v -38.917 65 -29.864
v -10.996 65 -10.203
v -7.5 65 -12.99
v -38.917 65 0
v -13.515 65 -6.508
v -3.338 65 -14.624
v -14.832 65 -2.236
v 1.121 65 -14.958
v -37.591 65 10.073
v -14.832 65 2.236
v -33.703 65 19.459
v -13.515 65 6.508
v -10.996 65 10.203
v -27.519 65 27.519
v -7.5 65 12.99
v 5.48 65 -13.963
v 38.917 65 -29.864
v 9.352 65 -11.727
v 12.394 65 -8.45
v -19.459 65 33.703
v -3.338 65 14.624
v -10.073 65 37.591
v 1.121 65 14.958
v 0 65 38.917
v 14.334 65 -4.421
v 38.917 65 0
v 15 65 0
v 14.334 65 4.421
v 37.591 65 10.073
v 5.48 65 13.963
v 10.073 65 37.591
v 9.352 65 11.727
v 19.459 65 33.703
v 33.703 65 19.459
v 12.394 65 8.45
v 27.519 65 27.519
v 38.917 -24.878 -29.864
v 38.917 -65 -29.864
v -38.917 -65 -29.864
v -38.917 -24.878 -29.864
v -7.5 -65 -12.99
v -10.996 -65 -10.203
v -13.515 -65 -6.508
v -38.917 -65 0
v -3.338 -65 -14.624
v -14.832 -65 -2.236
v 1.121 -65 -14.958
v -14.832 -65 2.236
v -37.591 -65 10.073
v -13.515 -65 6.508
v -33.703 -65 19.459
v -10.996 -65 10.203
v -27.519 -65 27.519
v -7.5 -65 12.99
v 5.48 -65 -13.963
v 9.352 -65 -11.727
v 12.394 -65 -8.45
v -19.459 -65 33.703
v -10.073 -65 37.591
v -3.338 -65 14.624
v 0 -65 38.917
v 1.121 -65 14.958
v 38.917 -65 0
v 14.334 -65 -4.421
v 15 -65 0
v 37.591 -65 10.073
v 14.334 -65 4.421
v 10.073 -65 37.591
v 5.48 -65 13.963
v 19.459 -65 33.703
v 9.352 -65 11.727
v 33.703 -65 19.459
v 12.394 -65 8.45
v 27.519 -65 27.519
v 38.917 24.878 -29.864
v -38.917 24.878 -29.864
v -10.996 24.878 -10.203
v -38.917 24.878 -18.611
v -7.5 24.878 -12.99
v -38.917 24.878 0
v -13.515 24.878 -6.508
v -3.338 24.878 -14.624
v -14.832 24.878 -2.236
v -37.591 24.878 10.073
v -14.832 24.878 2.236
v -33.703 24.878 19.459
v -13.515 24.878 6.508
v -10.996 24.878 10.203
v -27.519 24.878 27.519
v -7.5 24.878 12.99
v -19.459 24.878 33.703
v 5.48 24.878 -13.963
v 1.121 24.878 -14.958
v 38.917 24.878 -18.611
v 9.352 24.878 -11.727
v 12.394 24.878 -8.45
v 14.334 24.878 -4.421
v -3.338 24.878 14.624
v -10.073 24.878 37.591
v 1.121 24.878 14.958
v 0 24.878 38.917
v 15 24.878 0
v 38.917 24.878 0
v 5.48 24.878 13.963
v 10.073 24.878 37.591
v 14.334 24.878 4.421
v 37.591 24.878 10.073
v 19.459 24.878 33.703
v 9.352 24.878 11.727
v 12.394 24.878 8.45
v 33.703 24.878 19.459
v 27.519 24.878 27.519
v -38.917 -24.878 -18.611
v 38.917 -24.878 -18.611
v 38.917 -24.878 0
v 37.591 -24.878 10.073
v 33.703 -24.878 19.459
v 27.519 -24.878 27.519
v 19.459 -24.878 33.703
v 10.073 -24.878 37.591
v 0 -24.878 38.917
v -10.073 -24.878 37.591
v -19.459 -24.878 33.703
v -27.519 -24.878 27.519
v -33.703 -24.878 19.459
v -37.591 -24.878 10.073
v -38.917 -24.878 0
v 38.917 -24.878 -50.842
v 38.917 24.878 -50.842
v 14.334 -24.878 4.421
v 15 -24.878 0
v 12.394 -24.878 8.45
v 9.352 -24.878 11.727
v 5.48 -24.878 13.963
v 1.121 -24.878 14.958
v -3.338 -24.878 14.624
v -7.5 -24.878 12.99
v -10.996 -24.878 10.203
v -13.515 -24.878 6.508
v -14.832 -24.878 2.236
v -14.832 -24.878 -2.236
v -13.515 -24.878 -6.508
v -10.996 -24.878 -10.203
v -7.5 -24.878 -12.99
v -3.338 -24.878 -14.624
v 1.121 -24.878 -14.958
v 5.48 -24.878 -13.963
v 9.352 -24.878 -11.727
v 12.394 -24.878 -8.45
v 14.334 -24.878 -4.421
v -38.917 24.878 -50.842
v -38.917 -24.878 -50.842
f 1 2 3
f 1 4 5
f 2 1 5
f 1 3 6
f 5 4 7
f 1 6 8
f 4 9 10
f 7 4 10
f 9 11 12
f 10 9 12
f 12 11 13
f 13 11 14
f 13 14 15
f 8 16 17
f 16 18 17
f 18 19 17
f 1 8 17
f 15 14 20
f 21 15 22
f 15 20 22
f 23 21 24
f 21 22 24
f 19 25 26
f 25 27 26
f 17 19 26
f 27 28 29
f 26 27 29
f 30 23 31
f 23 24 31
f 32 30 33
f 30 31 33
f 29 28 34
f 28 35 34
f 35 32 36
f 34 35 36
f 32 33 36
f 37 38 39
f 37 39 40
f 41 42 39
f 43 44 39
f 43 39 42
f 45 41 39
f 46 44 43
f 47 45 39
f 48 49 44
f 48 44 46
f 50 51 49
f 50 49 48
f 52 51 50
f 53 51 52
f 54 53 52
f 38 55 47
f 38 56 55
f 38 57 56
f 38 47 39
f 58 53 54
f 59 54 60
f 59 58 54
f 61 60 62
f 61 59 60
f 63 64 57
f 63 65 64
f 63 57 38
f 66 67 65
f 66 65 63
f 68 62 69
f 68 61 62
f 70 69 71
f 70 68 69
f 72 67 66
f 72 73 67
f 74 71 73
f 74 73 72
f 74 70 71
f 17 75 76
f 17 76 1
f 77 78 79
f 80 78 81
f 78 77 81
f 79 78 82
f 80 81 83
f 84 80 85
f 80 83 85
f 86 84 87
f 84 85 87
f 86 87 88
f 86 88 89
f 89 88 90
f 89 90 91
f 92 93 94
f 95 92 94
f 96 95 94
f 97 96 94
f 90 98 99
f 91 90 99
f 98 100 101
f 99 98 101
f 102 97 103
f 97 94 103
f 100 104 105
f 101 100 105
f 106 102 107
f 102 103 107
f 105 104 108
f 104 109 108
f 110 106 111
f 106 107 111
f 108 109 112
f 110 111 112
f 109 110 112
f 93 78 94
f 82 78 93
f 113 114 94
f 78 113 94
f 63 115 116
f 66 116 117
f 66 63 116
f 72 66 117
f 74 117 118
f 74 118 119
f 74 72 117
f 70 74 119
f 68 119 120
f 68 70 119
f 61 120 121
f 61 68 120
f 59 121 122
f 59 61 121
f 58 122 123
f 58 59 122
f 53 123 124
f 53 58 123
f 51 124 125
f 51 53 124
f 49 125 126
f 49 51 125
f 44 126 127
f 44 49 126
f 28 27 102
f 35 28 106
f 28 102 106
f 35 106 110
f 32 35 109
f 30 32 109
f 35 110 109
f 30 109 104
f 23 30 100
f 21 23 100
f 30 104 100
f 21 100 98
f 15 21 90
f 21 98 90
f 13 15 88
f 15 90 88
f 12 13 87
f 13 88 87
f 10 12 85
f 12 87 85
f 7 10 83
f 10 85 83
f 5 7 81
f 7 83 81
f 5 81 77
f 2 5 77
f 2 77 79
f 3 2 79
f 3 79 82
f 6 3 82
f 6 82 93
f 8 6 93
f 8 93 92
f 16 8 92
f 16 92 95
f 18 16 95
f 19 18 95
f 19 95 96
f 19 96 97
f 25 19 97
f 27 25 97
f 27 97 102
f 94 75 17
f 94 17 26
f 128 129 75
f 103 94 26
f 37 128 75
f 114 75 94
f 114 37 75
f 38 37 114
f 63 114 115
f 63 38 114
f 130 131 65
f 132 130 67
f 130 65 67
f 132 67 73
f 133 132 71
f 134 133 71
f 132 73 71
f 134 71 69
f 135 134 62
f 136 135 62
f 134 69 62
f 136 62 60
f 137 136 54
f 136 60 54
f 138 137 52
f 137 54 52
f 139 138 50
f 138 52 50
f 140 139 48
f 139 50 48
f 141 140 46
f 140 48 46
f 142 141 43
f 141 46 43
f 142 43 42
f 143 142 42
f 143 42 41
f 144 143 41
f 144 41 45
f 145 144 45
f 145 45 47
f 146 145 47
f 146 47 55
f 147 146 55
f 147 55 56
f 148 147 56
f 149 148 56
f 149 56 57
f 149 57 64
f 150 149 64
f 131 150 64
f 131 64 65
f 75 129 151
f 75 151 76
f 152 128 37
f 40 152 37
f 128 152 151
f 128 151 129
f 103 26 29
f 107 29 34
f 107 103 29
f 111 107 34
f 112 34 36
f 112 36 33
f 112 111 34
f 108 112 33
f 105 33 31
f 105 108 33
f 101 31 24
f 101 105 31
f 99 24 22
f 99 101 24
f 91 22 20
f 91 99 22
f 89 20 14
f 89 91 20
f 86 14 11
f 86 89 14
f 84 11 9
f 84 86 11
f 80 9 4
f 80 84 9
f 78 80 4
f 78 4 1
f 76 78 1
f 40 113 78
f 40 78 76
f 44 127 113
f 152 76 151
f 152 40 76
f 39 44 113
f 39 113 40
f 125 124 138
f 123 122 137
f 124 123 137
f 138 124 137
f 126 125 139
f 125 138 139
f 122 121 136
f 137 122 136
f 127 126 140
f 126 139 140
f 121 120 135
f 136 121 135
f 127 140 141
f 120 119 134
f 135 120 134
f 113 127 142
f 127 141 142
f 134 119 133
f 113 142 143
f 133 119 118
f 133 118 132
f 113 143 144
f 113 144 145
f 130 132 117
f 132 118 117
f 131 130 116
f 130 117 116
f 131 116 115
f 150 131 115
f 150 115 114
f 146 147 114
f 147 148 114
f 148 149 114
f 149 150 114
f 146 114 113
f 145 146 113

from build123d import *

# Parameters (mm, degrees)
F1_DEPTH = 65
F3_W     = 40.1219656318
F3_H     = 20.9779888391
F3_W_2   = 49.7560687363
F3_H_2   = 38.9171534163
F3_H_3   = 18.6112551019
F4_DEPTH = 77.8353068326
F5_R     = 15
F6_DEPTH = 130.001


with BuildPart() as f1:
    # F0 (on Front) → F1 (new body, symmetric)
    with BuildSketch(Plane.XZ):
        with BuildLine():
            Line((38.9171534163, -50.8422553539), (38.9171534163, 0))
            ThreePointArc((38.9171534163, 0), (0, 38.9171534163), (-38.9171534163, 0))
            Line((-38.9171534163, 0), (-38.9171534163, -50.8422553539))
            Line((-38.9171534163, -50.8422553539), (38.9171534163, -50.8422553539))
        make_face()
    extrude(amount=F1_DEPTH, both=True)

    # F3 (on face) → F4 (cut, through all)
    with BuildSketch(Plane.YZ.offset(38.9171534163)):
        with Locations((-44.9390171841, -40.3532609344)):
            Rectangle(F3_W, F3_H)
        with Locations((44.9390171841, -40.3532609344)):
            Rectangle(F3_W, F3_H)
        with Locations((0, 19.4585767082)):
            Rectangle(F3_W_2, F3_H_2)
        with Locations((0, -9.3056275509)):
            Rectangle(F3_W_2, F3_H_3)
    extrude(amount=-F4_DEPTH, mode=Mode.SUBTRACT)

    # F5 (on face) → F6 (cut, through all)
    with BuildSketch(Plane.XZ.offset(65)):
        Circle(F5_R)
    extrude(amount=-F6_DEPTH, mode=Mode.SUBTRACT)


solid = f1.part
